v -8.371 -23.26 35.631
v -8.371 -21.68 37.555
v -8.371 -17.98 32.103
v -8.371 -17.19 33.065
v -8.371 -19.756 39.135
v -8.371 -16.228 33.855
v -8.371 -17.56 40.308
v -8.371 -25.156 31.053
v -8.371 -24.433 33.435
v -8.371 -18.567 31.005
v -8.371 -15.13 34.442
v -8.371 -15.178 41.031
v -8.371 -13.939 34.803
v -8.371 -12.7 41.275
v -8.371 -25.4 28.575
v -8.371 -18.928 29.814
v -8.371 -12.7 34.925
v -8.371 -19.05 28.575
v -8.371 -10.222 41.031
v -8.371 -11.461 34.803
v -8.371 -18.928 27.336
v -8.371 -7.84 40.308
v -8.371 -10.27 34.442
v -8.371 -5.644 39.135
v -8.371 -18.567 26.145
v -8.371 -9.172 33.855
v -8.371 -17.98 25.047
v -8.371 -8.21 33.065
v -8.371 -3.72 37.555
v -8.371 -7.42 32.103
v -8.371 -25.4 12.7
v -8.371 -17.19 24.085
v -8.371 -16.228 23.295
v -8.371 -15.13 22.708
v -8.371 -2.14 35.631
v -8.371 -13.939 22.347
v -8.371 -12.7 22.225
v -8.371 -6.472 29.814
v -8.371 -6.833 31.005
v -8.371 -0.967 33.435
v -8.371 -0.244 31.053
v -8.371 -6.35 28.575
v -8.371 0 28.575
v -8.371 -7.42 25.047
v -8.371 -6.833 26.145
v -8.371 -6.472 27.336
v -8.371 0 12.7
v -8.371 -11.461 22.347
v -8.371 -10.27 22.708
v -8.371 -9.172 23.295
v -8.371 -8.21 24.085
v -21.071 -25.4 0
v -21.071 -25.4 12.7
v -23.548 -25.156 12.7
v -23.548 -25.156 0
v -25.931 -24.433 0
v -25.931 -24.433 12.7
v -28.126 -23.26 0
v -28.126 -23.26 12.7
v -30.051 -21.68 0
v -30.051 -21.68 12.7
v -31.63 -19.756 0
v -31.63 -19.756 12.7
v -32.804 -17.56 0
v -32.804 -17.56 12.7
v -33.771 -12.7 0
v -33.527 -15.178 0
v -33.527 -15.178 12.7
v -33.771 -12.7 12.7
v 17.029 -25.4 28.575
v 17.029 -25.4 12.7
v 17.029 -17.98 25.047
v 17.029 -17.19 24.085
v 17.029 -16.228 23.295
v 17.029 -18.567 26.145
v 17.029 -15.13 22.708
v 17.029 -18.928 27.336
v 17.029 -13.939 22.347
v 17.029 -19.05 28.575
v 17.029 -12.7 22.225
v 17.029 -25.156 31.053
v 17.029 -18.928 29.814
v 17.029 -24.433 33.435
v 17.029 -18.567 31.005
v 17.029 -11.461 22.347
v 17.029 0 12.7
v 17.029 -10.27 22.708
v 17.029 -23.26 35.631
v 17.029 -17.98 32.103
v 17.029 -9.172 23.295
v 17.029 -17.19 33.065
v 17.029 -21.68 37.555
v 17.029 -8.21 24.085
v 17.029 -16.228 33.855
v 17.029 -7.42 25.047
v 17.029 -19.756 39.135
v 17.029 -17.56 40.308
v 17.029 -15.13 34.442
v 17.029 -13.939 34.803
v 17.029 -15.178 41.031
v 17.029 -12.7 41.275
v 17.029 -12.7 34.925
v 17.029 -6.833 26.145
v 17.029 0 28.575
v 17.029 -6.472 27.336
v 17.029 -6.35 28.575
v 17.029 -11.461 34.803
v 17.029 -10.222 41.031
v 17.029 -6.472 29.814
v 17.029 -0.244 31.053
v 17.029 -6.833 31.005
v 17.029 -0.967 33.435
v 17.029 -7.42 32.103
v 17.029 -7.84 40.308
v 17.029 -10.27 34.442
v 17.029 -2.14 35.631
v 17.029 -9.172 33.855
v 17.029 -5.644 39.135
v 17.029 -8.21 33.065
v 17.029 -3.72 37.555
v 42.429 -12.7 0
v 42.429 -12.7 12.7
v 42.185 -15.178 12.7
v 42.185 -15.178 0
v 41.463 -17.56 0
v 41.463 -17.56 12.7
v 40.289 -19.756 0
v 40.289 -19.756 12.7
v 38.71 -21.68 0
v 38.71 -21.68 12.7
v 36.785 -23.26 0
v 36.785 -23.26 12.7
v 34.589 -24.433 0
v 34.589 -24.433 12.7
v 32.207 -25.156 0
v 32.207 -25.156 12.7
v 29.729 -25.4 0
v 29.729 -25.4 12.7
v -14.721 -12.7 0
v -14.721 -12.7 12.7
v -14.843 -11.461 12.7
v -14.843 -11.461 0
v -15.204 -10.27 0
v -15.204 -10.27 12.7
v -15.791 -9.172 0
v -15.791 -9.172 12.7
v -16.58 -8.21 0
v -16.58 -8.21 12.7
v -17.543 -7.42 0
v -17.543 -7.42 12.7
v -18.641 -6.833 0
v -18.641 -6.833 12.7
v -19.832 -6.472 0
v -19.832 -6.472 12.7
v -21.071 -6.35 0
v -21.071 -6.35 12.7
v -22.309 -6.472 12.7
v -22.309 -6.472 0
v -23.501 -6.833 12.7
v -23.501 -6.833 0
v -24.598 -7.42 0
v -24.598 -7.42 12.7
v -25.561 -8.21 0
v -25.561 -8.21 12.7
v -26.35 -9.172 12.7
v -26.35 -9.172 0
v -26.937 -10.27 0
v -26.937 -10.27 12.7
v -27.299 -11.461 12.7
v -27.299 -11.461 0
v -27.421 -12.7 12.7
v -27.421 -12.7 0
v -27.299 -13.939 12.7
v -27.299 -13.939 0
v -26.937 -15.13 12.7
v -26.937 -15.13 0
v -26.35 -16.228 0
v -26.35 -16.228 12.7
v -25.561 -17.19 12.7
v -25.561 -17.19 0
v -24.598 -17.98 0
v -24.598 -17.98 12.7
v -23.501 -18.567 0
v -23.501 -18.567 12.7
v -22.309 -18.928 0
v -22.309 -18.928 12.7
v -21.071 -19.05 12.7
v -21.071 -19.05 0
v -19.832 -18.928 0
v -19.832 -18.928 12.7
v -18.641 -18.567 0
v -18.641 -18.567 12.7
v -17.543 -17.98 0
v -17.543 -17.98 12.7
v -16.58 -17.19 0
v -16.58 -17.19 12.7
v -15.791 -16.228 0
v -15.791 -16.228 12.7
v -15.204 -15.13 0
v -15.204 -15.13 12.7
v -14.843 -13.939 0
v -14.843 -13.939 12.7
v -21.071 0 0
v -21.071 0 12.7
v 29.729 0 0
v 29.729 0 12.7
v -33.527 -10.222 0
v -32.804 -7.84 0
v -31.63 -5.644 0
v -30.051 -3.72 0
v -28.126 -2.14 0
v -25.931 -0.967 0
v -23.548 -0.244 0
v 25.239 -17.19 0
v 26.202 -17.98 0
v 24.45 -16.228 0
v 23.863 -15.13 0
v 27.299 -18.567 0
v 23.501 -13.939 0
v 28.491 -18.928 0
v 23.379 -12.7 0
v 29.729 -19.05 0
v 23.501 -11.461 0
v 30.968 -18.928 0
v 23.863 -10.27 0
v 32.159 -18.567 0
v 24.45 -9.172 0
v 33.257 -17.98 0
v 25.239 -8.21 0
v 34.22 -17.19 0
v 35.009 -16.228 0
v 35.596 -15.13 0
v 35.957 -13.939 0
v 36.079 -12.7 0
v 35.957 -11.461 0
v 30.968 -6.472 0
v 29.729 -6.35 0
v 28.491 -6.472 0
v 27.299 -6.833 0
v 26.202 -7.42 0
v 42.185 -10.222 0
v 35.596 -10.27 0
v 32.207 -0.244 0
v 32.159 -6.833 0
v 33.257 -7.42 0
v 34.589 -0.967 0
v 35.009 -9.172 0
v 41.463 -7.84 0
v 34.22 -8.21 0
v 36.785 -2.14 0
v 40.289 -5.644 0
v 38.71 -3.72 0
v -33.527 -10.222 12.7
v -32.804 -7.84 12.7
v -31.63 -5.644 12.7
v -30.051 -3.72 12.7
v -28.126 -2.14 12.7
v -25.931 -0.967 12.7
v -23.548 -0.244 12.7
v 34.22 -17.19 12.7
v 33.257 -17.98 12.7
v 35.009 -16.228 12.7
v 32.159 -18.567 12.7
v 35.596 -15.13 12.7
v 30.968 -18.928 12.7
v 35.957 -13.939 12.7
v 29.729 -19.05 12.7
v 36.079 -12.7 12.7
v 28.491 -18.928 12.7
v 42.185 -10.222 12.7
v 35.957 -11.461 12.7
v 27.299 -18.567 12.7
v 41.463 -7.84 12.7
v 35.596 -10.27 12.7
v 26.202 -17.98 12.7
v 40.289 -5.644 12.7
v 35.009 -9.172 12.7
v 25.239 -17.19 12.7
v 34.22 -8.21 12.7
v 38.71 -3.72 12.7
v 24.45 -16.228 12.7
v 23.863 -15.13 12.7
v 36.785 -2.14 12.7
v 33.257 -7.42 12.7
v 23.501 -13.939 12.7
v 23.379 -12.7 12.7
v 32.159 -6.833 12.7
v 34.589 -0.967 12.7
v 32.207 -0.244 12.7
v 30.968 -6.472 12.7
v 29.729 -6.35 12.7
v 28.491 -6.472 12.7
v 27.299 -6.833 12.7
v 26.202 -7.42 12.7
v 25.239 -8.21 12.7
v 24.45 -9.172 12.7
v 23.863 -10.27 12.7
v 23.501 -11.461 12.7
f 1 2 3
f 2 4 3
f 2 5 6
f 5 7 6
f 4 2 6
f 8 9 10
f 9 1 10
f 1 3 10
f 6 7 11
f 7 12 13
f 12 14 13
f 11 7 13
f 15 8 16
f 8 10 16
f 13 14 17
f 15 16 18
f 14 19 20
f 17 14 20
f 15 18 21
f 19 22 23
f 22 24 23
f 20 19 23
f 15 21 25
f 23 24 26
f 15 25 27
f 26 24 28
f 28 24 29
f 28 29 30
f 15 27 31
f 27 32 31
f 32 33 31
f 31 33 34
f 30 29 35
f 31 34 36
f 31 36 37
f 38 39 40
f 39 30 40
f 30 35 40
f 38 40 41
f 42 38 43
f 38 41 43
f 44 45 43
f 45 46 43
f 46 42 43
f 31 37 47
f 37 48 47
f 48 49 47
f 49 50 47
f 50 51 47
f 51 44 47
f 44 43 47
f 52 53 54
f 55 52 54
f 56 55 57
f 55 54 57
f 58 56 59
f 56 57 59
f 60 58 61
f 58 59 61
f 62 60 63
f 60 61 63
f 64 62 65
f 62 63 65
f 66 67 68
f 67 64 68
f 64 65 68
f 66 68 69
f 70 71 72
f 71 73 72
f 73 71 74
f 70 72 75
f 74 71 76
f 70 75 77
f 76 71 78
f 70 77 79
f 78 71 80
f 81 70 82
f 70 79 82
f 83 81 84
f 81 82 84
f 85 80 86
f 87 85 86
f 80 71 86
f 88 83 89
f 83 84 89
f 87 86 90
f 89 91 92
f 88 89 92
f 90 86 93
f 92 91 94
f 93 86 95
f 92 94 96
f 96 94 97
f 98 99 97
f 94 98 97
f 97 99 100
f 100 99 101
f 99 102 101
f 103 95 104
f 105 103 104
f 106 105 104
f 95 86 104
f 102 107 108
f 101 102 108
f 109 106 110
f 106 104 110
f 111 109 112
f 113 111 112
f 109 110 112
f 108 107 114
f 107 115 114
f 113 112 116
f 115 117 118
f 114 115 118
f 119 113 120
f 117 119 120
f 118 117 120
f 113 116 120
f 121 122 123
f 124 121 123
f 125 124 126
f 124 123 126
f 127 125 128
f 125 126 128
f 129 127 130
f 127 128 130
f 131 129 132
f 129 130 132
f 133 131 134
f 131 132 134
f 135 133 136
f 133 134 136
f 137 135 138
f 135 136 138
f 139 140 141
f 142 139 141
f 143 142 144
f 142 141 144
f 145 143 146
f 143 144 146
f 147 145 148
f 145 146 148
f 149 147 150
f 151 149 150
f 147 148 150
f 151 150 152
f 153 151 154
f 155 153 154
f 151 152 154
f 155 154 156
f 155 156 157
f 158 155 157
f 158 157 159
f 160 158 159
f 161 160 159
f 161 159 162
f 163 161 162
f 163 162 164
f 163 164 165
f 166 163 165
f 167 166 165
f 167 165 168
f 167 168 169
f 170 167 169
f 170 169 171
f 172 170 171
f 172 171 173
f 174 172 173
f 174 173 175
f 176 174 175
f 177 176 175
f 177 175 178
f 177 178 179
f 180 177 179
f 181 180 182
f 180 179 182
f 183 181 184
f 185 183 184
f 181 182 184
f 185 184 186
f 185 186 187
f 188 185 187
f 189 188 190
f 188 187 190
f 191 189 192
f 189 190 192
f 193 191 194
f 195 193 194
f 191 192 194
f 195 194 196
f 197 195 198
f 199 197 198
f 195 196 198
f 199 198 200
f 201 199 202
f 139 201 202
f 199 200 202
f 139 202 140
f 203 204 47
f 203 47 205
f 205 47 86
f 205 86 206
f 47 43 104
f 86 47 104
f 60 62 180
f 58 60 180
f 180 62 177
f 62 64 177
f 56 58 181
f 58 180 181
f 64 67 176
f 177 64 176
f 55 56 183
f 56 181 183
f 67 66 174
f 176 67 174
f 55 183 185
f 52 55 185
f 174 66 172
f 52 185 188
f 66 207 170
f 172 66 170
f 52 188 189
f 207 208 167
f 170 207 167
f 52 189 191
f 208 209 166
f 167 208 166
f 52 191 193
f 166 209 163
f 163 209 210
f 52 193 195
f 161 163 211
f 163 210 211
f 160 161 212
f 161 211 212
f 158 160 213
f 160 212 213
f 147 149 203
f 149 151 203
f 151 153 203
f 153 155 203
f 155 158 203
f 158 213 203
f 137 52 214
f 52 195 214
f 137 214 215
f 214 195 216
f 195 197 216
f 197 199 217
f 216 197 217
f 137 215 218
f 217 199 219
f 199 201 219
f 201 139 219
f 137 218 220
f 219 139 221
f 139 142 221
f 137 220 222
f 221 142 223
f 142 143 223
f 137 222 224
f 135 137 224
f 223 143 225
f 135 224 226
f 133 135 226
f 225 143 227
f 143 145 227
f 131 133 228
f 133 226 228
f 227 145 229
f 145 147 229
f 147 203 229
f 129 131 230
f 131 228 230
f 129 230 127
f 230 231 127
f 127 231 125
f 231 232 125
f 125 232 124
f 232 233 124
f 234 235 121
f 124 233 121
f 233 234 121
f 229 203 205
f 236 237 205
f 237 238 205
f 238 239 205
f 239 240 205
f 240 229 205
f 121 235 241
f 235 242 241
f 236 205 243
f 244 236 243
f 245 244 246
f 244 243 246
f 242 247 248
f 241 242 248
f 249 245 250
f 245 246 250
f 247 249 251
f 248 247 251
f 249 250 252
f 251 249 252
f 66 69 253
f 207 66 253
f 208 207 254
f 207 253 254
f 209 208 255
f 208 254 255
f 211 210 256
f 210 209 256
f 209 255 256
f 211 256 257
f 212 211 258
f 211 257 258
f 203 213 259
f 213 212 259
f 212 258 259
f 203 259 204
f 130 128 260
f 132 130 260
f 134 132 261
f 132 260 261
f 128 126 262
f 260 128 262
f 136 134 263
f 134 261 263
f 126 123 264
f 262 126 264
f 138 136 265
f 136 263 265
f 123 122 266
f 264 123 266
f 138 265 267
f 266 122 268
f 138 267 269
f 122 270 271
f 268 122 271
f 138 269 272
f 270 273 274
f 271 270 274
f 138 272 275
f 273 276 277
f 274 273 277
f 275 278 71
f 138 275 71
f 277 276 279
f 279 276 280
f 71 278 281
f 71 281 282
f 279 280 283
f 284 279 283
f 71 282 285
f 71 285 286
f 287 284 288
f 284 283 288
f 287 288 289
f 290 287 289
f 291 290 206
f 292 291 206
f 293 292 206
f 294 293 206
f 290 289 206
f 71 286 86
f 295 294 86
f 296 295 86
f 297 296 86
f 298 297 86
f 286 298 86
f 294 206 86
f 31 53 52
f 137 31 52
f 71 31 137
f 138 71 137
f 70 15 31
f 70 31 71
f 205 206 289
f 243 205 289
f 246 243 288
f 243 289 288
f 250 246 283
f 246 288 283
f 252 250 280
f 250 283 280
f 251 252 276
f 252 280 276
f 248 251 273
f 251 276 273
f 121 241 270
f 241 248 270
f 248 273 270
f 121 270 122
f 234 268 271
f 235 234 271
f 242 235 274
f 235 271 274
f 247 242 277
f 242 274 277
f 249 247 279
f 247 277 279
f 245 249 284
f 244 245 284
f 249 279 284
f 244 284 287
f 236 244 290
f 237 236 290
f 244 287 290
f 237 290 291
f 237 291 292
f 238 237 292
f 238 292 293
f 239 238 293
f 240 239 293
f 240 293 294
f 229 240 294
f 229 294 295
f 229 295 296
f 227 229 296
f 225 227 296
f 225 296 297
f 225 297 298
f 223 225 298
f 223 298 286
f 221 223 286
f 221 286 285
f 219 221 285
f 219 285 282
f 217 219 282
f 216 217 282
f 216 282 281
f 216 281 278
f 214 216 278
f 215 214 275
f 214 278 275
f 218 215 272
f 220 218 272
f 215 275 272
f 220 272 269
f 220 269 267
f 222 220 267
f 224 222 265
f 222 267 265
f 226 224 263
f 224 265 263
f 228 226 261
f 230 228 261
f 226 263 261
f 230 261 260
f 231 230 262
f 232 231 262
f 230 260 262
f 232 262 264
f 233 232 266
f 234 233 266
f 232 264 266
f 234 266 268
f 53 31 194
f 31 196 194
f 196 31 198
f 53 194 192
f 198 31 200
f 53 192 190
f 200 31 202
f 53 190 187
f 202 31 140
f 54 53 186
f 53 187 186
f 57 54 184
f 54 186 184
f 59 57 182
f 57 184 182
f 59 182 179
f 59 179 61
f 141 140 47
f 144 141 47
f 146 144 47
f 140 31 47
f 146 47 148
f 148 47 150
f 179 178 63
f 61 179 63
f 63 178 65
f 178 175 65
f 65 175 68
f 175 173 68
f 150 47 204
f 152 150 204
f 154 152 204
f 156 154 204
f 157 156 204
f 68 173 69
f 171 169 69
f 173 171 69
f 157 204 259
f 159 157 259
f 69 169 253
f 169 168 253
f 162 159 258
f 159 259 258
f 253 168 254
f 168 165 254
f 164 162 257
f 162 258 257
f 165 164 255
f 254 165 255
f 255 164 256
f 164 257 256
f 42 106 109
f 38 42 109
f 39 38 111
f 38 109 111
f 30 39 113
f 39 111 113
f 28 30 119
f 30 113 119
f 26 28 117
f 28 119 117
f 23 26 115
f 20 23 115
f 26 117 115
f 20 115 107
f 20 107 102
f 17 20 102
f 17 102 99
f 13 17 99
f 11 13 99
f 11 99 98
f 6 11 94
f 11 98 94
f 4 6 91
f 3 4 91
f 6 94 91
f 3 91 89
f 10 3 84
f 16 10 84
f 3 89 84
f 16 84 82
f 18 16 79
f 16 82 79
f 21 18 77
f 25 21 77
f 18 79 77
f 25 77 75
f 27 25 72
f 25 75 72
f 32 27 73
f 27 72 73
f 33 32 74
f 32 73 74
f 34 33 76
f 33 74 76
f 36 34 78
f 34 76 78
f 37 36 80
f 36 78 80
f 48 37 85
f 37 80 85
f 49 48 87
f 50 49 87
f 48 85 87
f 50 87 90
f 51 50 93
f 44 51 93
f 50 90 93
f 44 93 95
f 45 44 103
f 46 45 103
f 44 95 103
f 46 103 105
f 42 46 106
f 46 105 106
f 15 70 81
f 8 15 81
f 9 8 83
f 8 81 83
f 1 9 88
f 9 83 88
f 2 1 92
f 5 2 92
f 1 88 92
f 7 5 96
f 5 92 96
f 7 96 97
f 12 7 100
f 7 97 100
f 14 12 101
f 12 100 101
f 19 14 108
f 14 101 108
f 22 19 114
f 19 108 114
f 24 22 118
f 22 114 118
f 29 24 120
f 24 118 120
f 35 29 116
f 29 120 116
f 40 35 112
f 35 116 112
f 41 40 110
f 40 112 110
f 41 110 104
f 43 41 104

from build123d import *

# Parameters (mm, degrees)
F1_DEPTH  = 25.4
F3_DEPTH  = 25.4
F4_R      = 6.35
F5_DEPTH  = 25.4
F7_DEPTH  = 25.4
F9_DEPTH  = 25.4
F10_R     = 6.35
F11_DEPTH = 25.4
F12_R     = 6.35
F13_DEPTH = 25.4


with BuildPart() as f1:
    # F0 (on Front) → F1 (new body)
    with BuildSketch(Plane.XZ):
        Polygon((-33.770596805, 12.7), (-33.770596805, 0), (42.429403195, 0), (42.429403195, 12.7), (17.029403195, 12.7), (17.029403195, 44.45), (-8.370596805, 44.45), (-8.370596805, 12.7), align=None)
    extrude(amount=F1_DEPTH)

    # F2 (on face) → F3 (cut)
    with BuildSketch(Plane.YZ.offset(17.029403195)):
        with BuildLine():
            ThreePointArc((-25.4, 28.575), (-12.7, 41.275), (0, 28.575))
            Line((0, 28.575), (0, 44.45))
            Line((0, 44.45), (-25.4, 44.45))
            Line((-25.4, 44.45), (-25.4, 28.575))
        make_face()
    extrude(amount=-F3_DEPTH, mode=Mode.SUBTRACT)

    # F4 (on face) → F5 (cut)
    with BuildSketch(Plane.YZ.offset(17.029403195)):
        with Locations((-12.7, 28.575)):
            Circle(F4_R)
    extrude(amount=-F5_DEPTH, mode=Mode.SUBTRACT)

    # F6 (on face) → F7 (cut)
    with BuildSketch(Plane.XY.offset(12.7)):
        with BuildLine():
            ThreePointArc((29.729403195, 0), (38.7096593161, -3.7197438789), (42.429403195, -12.7))
            Line((42.429403195, -12.7), (42.429403195, 0))
            Line((42.429403195, 0), (29.729403195, 0))
        make_face()
        with BuildLine():
            Line((42.429403195, -25.4), (42.429403195, -12.7))
            ThreePointArc((42.429403195, -12.7), (38.7096593161, -21.6802561211), (29.729403195, -25.4))
            Line((29.729403195, -25.4), (42.429403195, -25.4))
        make_face()
    extrude(amount=-F7_DEPTH, mode=Mode.SUBTRACT)

    # F8 (on face) → F9 (cut)
    with BuildSketch(Plane.XY.offset(12.7)):
        with BuildLine():
            ThreePointArc((-33.770596805, -12.7), (-30.0508529261, -3.7197438789), (-21.070596805, 0))
            Line((-21.070596805, 0), (-33.770596805, 0))
            Line((-33.770596805, 0), (-33.770596805, -12.7))
        make_face()
        with BuildLine():
            Line((-33.770596805, -25.4), (-21.070596805, -25.4))
            ThreePointArc((-21.070596805, -25.4), (-30.0508529261, -21.6802561211), (-33.770596805, -12.7))
            Line((-33.770596805, -12.7), (-33.770596805, -25.4))
        make_face()
    extrude(amount=-F9_DEPTH, mode=Mode.SUBTRACT)

    # F10 (on face) → F11 (cut)
    with BuildSketch(Plane.XY.offset(12.7)):
        with Locations((-21.070596805, -12.7)):
            Circle(F10_R)
    extrude(amount=-F11_DEPTH, mode=Mode.SUBTRACT)

    # F12 (on face) → F13 (cut)
    with BuildSketch(Plane.XY.offset(12.7)):
        with Locations((29.729403195, -12.7)):
            Circle(F12_R)
    extrude(amount=-F13_DEPTH, mode=Mode.SUBTRACT)


solid = f1.part
